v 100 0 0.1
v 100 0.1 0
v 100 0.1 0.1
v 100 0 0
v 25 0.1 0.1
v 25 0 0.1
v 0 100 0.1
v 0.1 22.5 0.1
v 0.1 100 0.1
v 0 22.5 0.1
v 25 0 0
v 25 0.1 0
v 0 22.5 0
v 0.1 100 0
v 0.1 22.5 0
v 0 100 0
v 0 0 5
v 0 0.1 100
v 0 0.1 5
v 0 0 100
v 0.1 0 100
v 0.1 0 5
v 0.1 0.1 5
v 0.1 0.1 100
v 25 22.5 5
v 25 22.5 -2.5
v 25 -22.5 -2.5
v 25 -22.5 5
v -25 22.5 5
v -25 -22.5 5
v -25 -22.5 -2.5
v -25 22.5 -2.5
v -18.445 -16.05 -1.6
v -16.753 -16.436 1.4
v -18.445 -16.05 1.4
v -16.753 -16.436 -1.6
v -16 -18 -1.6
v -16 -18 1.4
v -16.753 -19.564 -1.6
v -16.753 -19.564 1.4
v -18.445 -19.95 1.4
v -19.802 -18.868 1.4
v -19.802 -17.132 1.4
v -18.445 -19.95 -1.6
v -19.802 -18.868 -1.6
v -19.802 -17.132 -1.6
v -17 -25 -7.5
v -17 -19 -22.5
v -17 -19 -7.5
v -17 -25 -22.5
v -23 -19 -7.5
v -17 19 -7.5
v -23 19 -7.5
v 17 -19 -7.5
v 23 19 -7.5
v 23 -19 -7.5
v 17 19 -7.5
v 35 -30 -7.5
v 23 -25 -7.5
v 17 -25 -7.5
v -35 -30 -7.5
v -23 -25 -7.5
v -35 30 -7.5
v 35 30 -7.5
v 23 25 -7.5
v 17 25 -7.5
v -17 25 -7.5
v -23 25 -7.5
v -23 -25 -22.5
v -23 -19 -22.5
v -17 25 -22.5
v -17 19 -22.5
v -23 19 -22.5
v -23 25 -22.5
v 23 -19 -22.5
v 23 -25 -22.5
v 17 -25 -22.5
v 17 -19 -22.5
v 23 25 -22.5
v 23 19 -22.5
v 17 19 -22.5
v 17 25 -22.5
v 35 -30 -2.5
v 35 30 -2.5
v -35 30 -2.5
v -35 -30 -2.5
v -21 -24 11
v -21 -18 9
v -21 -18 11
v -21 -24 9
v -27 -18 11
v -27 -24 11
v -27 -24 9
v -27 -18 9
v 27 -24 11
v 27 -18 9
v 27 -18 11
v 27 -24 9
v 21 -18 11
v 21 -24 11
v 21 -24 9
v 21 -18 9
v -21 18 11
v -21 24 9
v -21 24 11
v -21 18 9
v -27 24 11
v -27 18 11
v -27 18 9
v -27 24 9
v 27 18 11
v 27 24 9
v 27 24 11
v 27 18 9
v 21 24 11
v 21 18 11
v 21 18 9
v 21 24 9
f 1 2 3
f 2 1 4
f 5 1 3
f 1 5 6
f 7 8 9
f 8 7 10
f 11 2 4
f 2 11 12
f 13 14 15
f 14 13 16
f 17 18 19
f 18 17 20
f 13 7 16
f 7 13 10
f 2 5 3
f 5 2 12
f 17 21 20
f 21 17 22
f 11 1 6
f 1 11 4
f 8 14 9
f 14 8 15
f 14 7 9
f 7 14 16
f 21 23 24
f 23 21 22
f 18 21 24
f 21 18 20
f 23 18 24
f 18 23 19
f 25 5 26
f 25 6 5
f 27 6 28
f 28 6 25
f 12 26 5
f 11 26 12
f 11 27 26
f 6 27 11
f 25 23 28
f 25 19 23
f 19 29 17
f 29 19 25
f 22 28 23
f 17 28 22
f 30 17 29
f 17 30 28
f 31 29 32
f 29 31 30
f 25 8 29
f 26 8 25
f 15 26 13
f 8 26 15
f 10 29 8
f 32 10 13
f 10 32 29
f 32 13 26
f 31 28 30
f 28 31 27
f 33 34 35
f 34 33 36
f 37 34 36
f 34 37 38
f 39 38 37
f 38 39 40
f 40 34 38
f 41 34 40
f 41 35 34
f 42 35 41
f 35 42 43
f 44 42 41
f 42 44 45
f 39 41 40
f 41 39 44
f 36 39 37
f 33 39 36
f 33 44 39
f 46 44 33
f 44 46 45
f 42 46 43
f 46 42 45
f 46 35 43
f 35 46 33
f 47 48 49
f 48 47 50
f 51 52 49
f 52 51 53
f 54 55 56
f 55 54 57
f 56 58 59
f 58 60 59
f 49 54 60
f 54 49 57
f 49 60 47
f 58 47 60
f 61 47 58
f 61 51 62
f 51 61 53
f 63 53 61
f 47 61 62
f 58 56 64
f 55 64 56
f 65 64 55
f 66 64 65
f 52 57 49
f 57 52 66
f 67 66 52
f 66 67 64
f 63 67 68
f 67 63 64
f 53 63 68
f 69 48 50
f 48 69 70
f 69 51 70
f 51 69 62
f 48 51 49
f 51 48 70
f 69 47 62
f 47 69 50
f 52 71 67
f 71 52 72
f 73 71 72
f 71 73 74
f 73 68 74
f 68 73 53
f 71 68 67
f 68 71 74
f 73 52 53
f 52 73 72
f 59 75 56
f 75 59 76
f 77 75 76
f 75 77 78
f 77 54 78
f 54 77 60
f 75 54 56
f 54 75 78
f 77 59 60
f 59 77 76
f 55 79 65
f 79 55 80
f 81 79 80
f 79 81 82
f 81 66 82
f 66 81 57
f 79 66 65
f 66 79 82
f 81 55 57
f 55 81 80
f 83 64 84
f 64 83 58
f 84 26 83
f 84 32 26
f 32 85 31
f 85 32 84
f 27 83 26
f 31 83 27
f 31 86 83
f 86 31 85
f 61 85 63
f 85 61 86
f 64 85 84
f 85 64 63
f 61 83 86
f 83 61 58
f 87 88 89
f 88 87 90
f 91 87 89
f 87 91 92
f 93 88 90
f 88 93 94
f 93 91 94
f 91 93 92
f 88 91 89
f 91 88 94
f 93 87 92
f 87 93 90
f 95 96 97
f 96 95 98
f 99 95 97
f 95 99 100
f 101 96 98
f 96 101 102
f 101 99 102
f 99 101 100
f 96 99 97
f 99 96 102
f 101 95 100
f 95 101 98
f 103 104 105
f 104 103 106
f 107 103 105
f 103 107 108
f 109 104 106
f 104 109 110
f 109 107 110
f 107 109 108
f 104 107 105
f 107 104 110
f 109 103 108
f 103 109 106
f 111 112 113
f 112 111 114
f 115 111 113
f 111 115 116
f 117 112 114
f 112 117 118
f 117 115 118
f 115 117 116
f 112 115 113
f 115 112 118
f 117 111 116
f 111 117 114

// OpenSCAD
    // Combined Scene

    // Permanent Model
    
    // Permanent Model (Black)
    color([0, 0, 0]) {
        // Your permanent model code here
        cube([100,0.1,0.1], center = false);
        cube([0.1,100,0.1], center = false);
        cube([0.1,0.1,100], center = false);
    }
    

    // Dynamic Model
    translate([0, 0, 0]) {
    // Chair seat dimensions
    seat_height = 10;  // Adjusted for better height
    seat_width = 50; 
    seat_depth = 45; 
    difference() {
        cube([seat_width, seat_depth, seat_height], center=true); // Main seat
        translate([-18, -18, -0.1]) 
            cylinder(h=3, r=2, center=true); // Cutout for lighter seat
    }

    // Ergonomic backrest with a smooth curve
    backrest_height = 30; 
    backrest_width = 50; 
    translate([0, -22, seat_height]) {
        rotate_extrude(angle=180) {
            translate([0, 8, 0])
                circle(r=20); // Smooth backrest curve
        }
    }

    // Chair legs with strength and stability
    leg_height = 15; 
    leg_thickness = 6;  // Thicker legs for more stability
    for (x = [-1, 1]) {
        for (y = [-1, 1]) {
            translate([20 * x, 22 * y, -leg_height]) {
                cube([leg_thickness, leg_thickness, leg_height], center=true); // All four legs
            }
        }
    }

    // Curved armrests for comfort
    armrest_thickness = 5; 
    for (x = [-1, 1]) {
        translate([25 * x, -25, 10]) {
            difference() {
                scale([1, 0.5, 1])
                    rotate_extrude(angle=180)
                        translate([0, 4, 0])
                        circle(r=7); // Wider armrest contour
                translate([-6, -0.5, 0])
                    cube([12, 1, armrest_thickness], center=true); // Armrest thickness
            }
        }
    }

    // Base for added stability 
    base_height = 5; 
    base_width = 70; 
    base_depth = 60; 
    translate([0, 0, -base_height]) {
        cube([base_width, base_depth, base_height], center=true); // Base platform
    }
    
    // Tolerance cuts for leg attachment
    tolerance_height = 2;  // Reduced tolerance height for snug fit
    translate([-24, -21, seat_height]) {
        cube([6, 6, tolerance_height], center=true); // Tolerance cutout for leg attachment
    }
    
    translate([24, -21, seat_height]) {
        cube([6, 6, tolerance_height], center=true); // Tolerance cutout for leg attachment
    }

    translate([-24, 21, seat_height]) {
        cube([6, 6, tolerance_height], center=true); // Tolerance cutout for leg attachment
    }

    translate([24, 21, seat_height]) {
        cube([6, 6, tolerance_height], center=true); // Tolerance cutout for leg attachment
    }
}
    
